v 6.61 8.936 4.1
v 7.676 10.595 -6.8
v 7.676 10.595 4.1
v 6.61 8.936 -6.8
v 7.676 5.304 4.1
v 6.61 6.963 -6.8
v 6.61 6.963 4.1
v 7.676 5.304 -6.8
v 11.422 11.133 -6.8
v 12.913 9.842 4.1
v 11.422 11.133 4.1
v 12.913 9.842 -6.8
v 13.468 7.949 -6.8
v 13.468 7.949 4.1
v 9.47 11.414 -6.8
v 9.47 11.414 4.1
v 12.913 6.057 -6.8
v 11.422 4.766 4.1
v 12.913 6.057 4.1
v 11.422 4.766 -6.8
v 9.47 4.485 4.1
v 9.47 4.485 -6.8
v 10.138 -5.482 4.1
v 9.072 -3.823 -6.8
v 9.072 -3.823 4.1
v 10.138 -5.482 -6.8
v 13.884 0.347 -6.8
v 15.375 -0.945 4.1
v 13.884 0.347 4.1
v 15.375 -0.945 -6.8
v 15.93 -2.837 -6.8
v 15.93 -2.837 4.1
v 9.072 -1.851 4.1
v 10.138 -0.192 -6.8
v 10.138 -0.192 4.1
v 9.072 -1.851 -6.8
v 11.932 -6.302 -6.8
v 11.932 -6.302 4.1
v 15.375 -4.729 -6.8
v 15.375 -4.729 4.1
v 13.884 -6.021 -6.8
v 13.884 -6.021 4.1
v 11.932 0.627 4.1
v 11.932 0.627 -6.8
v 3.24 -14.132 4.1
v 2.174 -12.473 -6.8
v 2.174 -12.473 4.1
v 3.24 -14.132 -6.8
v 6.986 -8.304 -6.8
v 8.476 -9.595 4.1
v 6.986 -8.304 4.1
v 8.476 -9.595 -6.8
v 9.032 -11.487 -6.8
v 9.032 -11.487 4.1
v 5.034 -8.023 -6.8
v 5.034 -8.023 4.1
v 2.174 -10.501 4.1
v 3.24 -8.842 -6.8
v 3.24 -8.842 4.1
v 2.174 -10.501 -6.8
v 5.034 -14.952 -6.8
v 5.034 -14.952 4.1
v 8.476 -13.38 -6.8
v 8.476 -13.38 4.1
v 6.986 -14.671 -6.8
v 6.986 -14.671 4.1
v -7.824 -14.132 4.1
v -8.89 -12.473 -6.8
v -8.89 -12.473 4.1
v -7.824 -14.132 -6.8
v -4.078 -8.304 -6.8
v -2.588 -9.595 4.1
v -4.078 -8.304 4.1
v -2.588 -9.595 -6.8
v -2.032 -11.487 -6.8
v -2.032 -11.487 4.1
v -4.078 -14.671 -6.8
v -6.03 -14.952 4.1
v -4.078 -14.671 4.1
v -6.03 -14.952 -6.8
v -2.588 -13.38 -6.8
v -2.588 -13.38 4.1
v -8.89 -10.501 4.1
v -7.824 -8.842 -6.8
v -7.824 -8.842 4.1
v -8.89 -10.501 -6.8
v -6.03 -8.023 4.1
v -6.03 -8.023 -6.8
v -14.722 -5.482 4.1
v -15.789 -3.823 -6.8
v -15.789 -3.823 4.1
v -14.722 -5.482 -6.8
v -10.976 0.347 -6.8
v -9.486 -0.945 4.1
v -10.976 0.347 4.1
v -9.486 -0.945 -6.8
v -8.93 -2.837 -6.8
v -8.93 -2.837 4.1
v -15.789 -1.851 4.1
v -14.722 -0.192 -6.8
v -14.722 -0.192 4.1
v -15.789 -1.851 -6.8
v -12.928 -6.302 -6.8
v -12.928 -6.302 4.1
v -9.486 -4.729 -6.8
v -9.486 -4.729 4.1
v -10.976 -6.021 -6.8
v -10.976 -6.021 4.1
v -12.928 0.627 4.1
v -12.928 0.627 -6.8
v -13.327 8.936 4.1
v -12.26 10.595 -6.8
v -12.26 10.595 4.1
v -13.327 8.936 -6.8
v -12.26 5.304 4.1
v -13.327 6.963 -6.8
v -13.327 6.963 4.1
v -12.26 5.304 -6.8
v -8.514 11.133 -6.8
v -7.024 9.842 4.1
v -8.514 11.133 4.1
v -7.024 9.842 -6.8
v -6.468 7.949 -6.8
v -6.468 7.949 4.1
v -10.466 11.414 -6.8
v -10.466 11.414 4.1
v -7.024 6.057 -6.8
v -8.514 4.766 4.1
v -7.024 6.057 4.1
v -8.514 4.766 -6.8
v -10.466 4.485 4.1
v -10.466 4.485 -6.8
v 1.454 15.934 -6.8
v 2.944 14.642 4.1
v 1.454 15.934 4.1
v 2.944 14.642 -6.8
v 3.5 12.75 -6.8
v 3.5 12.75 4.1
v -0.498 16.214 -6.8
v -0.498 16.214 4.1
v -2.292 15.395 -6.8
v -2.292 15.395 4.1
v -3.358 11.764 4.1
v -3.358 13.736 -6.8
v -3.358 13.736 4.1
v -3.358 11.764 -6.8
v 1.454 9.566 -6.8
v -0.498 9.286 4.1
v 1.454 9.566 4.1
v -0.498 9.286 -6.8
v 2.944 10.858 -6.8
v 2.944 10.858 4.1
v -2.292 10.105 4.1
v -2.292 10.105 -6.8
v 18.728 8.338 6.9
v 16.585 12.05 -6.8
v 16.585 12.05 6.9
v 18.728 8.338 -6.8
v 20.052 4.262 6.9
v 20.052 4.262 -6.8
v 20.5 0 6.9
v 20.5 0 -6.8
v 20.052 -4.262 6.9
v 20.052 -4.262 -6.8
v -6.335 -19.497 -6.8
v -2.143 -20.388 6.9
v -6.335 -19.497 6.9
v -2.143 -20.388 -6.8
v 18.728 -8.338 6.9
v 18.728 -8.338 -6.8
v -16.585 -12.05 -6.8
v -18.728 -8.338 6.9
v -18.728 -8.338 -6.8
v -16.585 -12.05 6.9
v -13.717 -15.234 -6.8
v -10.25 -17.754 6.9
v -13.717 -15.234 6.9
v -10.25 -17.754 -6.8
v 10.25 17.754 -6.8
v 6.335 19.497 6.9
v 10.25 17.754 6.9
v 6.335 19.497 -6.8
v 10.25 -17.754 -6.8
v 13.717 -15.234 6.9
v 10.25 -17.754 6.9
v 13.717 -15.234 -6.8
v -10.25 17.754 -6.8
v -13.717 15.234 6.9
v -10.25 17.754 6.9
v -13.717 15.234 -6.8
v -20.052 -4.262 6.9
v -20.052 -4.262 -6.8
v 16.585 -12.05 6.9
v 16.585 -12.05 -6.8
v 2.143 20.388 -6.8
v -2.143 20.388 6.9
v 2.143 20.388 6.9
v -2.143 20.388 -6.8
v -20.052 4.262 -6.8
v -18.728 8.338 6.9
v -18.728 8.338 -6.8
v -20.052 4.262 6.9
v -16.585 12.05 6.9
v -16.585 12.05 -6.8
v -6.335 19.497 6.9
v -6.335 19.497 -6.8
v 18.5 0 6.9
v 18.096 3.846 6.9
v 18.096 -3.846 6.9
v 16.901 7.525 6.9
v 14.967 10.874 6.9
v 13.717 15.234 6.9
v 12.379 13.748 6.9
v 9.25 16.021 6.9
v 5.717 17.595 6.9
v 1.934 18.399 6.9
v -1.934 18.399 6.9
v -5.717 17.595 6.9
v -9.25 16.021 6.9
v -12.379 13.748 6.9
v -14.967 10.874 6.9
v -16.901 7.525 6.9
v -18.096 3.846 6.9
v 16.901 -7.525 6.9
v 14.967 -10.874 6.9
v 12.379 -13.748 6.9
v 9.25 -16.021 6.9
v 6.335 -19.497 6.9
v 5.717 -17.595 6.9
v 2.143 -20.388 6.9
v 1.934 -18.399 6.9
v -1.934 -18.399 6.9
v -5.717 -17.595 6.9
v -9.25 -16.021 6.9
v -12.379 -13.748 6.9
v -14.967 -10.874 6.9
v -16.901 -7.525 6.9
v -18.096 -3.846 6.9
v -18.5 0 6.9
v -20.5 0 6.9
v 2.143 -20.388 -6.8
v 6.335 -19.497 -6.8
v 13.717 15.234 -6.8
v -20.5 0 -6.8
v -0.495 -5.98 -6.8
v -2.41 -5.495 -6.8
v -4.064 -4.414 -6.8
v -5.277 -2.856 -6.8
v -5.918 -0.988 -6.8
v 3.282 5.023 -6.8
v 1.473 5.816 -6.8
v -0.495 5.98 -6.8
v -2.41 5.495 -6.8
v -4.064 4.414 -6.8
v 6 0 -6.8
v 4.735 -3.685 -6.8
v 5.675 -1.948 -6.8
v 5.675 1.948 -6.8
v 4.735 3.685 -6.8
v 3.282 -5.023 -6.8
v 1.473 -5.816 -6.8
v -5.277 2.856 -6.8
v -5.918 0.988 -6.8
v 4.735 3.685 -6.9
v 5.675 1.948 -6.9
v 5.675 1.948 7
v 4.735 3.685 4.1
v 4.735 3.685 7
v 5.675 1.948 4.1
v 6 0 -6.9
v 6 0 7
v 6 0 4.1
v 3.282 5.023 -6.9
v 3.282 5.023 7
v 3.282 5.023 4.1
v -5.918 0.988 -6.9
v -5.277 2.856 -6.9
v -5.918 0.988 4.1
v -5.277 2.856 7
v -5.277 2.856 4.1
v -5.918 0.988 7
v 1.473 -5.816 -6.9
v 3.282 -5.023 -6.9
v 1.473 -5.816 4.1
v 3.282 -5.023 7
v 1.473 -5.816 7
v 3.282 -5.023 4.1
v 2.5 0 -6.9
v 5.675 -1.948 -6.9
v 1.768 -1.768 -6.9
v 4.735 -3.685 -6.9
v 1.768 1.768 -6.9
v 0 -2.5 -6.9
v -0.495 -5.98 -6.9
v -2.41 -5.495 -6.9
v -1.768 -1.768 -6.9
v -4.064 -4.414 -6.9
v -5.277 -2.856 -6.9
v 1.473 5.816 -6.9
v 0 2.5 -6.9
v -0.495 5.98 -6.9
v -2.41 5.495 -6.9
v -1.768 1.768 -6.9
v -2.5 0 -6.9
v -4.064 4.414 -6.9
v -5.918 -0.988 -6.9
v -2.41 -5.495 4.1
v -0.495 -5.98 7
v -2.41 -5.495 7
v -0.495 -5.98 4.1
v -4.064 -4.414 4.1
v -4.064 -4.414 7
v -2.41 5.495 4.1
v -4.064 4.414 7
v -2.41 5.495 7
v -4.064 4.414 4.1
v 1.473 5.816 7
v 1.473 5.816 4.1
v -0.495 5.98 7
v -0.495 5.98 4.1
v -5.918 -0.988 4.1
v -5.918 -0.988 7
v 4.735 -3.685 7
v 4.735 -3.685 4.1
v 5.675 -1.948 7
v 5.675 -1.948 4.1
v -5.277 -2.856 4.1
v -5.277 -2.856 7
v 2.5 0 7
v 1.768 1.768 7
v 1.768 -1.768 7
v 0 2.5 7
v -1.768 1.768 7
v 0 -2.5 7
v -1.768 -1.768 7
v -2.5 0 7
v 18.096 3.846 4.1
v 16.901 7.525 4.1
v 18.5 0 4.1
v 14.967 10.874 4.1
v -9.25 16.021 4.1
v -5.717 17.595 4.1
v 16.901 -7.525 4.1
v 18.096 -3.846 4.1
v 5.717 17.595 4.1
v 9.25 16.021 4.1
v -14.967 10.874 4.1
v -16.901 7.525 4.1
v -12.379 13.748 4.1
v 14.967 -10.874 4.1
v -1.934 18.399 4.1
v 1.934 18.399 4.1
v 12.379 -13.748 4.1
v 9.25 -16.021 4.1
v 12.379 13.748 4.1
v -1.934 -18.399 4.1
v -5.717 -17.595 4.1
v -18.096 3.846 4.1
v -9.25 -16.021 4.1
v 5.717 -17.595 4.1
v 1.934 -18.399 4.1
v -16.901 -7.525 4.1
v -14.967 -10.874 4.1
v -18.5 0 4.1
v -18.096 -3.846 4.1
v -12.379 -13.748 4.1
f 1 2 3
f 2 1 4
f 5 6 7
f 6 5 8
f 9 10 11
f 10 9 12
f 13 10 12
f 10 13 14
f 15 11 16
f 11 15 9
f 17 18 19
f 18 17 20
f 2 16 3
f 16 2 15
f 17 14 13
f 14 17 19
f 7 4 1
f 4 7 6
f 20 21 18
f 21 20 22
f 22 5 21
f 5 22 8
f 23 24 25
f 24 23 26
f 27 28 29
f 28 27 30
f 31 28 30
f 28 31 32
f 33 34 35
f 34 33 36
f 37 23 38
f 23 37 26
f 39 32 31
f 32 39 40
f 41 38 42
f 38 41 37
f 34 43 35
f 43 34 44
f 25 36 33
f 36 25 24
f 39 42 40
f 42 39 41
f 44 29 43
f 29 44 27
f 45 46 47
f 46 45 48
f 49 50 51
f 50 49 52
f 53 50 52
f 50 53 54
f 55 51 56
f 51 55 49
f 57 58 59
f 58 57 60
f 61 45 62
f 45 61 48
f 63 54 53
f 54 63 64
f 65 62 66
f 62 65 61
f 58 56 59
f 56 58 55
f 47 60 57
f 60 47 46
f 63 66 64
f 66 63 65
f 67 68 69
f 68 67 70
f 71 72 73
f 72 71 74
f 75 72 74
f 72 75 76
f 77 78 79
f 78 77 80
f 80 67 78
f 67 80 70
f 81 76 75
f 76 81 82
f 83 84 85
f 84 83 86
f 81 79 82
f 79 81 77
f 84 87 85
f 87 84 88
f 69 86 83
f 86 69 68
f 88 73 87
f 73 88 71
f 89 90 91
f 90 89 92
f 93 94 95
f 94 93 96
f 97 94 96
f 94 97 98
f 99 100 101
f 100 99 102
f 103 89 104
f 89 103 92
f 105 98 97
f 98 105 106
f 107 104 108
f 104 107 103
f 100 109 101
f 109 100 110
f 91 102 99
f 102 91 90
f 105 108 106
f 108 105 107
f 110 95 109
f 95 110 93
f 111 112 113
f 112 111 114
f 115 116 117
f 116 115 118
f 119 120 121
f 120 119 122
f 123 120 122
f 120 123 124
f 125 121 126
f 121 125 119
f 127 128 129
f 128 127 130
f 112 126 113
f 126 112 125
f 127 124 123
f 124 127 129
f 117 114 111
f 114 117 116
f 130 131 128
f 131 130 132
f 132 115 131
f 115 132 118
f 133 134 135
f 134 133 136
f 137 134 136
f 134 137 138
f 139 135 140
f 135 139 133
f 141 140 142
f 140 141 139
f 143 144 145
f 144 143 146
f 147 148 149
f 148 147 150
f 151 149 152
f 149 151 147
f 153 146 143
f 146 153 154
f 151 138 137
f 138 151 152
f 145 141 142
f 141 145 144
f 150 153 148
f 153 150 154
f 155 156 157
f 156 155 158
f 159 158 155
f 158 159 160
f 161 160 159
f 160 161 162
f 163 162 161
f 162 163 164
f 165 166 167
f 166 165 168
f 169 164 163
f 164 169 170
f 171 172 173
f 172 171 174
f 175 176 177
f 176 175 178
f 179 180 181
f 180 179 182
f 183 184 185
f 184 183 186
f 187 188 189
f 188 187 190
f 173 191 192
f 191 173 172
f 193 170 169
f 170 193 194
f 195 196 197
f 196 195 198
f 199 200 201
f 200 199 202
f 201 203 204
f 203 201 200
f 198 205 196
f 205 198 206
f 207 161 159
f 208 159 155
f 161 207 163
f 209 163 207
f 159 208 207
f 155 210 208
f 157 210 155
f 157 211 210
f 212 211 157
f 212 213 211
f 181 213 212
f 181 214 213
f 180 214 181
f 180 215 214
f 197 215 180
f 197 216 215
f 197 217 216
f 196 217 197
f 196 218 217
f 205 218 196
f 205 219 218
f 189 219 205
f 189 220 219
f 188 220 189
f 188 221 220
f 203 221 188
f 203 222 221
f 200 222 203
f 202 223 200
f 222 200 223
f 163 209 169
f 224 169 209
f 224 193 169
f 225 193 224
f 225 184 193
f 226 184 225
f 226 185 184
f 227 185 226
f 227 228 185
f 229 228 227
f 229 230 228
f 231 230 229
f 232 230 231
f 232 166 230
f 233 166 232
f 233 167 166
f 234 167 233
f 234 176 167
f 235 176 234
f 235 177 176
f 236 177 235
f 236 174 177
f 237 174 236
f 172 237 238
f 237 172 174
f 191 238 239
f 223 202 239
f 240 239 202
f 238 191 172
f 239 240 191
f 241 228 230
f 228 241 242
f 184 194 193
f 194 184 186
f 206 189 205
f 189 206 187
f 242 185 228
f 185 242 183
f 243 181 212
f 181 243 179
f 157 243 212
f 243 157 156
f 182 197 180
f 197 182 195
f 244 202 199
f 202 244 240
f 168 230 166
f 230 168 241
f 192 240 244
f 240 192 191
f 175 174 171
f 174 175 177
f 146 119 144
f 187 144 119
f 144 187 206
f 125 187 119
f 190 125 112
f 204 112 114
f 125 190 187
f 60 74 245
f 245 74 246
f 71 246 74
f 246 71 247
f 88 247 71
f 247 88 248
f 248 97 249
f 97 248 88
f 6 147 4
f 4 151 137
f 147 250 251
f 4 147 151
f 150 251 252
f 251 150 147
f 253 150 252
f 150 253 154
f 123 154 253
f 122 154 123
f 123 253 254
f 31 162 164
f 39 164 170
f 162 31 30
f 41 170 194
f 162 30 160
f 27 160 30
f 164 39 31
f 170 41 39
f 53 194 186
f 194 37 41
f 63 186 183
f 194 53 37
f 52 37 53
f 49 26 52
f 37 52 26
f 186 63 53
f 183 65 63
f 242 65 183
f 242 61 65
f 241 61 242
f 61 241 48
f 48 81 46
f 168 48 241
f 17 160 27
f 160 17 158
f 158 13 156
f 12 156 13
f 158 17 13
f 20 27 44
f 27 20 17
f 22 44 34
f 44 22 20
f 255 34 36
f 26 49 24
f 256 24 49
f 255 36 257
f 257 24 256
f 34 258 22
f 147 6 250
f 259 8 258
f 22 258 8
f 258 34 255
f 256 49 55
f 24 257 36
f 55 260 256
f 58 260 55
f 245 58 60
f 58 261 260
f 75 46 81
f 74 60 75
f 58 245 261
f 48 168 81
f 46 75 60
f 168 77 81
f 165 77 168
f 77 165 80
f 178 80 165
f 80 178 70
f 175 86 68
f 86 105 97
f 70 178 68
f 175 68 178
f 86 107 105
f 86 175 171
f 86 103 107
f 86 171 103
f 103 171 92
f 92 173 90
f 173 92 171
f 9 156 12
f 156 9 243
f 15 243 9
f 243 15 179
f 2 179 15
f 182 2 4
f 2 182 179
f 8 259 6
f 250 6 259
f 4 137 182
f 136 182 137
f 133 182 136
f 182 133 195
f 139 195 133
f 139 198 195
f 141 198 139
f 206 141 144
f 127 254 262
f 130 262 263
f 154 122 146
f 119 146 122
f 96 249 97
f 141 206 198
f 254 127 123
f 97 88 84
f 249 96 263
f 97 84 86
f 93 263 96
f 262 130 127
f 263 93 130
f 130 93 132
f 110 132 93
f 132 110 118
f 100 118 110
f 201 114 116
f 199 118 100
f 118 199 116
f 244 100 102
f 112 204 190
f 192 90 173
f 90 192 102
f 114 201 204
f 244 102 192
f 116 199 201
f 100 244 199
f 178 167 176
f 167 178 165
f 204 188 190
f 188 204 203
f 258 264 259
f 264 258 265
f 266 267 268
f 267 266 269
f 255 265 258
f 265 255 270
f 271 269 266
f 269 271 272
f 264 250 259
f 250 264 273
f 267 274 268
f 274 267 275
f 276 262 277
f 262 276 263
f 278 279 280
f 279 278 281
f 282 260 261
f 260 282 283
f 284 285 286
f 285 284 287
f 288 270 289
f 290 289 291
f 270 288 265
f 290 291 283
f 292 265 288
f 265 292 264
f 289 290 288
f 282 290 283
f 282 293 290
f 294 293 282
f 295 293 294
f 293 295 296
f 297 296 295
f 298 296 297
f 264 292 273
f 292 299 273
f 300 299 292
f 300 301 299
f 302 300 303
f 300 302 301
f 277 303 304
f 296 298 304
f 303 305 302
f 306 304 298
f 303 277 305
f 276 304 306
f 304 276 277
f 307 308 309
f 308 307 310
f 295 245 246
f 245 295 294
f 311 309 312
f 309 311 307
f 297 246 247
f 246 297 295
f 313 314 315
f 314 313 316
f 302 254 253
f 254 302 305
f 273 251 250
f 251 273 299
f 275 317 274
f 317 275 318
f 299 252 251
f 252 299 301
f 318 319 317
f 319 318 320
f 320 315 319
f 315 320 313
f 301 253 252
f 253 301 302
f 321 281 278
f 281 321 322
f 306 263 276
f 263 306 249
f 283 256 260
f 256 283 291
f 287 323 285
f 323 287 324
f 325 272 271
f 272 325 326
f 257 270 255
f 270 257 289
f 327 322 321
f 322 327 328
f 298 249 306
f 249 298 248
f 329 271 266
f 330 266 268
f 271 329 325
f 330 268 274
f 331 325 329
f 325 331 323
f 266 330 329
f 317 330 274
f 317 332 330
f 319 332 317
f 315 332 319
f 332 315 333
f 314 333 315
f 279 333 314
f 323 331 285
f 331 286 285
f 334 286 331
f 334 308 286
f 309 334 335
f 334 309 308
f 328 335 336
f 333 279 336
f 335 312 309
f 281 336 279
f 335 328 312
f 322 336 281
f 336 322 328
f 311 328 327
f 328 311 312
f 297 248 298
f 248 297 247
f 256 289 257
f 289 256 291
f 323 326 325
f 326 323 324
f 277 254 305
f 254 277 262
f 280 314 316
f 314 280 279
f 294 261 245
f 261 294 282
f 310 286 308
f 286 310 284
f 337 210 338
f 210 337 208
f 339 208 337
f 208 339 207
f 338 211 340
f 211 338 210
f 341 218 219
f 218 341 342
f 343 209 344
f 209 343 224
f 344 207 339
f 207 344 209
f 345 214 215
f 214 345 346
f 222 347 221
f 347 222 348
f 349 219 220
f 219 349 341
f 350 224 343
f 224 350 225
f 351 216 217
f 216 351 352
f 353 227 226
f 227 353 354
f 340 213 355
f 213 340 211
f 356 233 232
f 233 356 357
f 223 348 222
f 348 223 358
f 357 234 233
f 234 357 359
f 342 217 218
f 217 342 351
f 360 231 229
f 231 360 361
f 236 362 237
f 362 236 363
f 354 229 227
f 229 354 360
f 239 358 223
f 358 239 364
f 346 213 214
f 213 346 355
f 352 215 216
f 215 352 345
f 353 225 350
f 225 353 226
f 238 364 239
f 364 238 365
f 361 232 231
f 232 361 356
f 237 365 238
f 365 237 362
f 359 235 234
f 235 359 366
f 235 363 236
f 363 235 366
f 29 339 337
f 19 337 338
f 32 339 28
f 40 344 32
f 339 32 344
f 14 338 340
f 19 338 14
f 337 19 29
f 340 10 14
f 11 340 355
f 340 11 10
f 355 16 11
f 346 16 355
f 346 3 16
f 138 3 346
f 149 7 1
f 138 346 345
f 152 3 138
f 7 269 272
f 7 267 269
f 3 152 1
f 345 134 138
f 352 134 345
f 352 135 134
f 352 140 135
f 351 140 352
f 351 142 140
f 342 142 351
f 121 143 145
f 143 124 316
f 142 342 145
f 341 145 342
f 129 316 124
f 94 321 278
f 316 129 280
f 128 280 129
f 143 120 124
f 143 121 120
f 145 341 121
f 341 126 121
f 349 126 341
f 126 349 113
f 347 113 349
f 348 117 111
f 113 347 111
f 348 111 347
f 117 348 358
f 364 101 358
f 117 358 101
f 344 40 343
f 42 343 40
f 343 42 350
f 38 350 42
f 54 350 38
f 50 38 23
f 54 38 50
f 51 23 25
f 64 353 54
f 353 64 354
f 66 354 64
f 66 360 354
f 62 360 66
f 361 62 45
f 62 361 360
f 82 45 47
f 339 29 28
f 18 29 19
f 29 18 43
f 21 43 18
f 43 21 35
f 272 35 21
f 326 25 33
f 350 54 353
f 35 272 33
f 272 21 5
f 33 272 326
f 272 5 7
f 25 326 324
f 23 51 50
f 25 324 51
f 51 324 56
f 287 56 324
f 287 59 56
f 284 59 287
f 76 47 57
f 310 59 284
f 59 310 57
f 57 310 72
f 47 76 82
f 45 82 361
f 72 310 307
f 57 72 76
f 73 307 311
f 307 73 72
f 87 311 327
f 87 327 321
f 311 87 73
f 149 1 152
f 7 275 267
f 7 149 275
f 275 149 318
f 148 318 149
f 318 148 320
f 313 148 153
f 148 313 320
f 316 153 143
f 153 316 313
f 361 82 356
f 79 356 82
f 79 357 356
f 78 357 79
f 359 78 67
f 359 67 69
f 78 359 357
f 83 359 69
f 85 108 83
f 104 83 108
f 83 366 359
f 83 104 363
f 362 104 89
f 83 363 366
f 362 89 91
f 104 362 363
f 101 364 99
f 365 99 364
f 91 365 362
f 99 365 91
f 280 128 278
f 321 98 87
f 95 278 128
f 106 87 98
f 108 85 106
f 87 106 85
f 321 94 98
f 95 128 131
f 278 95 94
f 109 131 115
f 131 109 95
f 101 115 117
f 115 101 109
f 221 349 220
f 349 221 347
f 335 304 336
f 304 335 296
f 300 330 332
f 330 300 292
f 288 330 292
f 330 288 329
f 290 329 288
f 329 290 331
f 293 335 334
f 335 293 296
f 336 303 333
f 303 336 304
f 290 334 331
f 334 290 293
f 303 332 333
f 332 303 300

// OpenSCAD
// Helical Gears
// Catarina Mota
// catarinamfmota@gmail.com
// 20091123


//GEAR PARAMETERS
doubleHelical=1; //int: 0=no, 1=yes (will make the gear 2x taller)

gearHeight=7; //gear depth

pitchDiam=45; //pitch diameter

shaftDiam=5; //shaft diameter

//TEETH PARAMETERS
teethNum=20; //number of teeth (int)

addendum=2;

dedendum=2;

toothWidth=2;

angle=-30; //positive=right, negative=left

orientation=-1; //int: 1=left, -1=right

use_involute = true;

//CENTER SHAPE PARAMETERS
centerShape=3; //int: solid=1, star=2, circle=3

starNum=6; //number of lines for star shape (int)
starWidth=2; //width of star lines

circleNum=7; //number of circles (int)
circleDiam=7; //diameter of circles

//CENTER CIRCLE PARAMETERS
extrudeOut=1; //int: 0=no, 1=yes
extrudeOutHeight=3;
extrudeOutWidth=7; //in relationship to shaft

extrudeIn=1; //int: 0=no, 1=yes
extrudeInDiam=pitchDiam/2-dedendum*2;
extrudeInHeight=3;

//ROME (extrudeIn must be set to 0)
rome=0; //int: 0=no, 1=yes
romeDiam=pitchDiam/2; //pitch diameter for top gear
romeHeight=gearHeight; //top gear height
romeTeeth=teethNum*2/3;
romeAdd=2; //top gear addendum
romeDed=2; //top gear dedendum
romeToothWidth=2; //teeth width for top gear
romeAngle=5; //rotate top gear (angle)

//----------------------

gear();

//----------------------

//TOOTH
module tooth(heightGear, diamPitch) {

	toothHeight=addendum+dedendum*2;

	union(){
		translate([0,toothHeight/2,0]) rotateTooth(1);
		if (doubleHelical==1){
			translate([0,toothHeight/2,-heightGear+0.1]) rotateTooth(-1);
		}
	}

	module rotateTooth(direction){
		difference(){
			rotate([0,direction*angle,0])
			box(toothWidth,toothHeight,heightGear*1.5);

			translate([0,0,heightGear*0.75+dedendum/2])
			box(heightGear,toothHeight+0.5,dedendum+heightGear/2);

			translate([0,0,-heightGear*0.75-dedendum/2])
			box(heightGear,toothHeight+0.5,dedendum+heightGear/2);
		}
	}
}


//HELICAL
module helical(numTeeth, diamPitch, heightGear) {
	rootRad=diamPitch/2-dedendum;
	difference(){
		if (use_involute) {
			for (i = [ [0, 1, 0], [-heightGear, -1, 0.5] ]) {
				translate([ 0, 0, i[0] ]) rotate([ 0, 0, -angle*(i[2]) ])
				dxf_linear_extrude(file = str("invgear_n", numTeeth,
							"_m", (rootRad*2 + dedendum)/numTeeth,
							"_autogen.dxf"),
						convexity = 10, height = heightGear, twist = i[1]*angle/2, center = true);
			}
		}
		if (!use_involute) {
			for (i = [1:numTeeth]) {
				translate([sin(360*i/numTeeth)*(rootRad-dedendum), cos(360*i/numTeeth)*(rootRad-dedendum), 0 ]){
					rotate([0,0,-360*i/numTeeth]) tooth(heightGear, diamPitch);
				}
			}
		}
		translate([0,0,-gearHeight/2-1]) cylinder(heightGear+2, diamPitch/2-dedendum, diamPitch/2-dedendum);
	}
}

//SOLID
module solid(heightGear, diamPitch) {
	rootRad=diamPitch/2-dedendum;
	translate([0,0,-(heightGear*doubleHelical)+0.1*doubleHelical])
	cylinder(heightGear+(heightGear-0.1)*doubleHelical, rootRad, rootRad);
}

//STAR
module star() {
	starAngle=360/starNum;
	rootRad=diamPitch/2-dedendum;
	union(){
		for (s=[1:starNum]){
			translate([0,0,gearHeight/2-(gearHeight/2*doubleHelical)]){
				rotate([0, 0, s*starAngle]) dislocateBox(starWidth, (pitchDiam/2-dedendum*2)/2, gearHeight+(gearHeight*doubleHelical));
			}
		}
		translate ([0,0,-gearHeight*doubleHelical])
		tube(gearHeight+(gearHeight*doubleHelical), pitchDiam/2-dedendum, starWidth);
		translate ([0,0,-gearHeight*doubleHelical]){
			tube(gearHeight+(gearHeight*doubleHelical), pitchDiam/4+dedendum, starWidth);
			//cylinder(gearHeight+(gearHeight*doubleHelical), pitchDiam/4+dedendum, pitchDiam/4+dedendum);
		}
		translate([0,0,-gearHeight*doubleHelical])
		cylinder(gearHeight+(gearHeight*doubleHelical), shaftDiam/2+starWidth, shaftDiam/2+starWidth);
	}
}

//CIRCLE
module circle() {
	rootRad=pitchDiam/2-dedendum;
	difference(){
		solid(gearHeight-0.1*doubleHelical, pitchDiam);
		for (c=[1:circleNum]){
			translate([sin(360*c/circleNum)*(rootRad/2+shaftDiam/2), cos(360*c/circleNum)*(rootRad/2+shaftDiam/2), -gearHeight*doubleHelical]){
				cylinder(gearHeight+gearHeight*doubleHelical, circleDiam/2, circleDiam/2);
			}
		}
	}
}

//ROME
module romeGear(){
	translate([0,0,romeHeight/2+gearHeight]){
		rotate([0,0,romeAngle]){
			union(){
				helical(romeTeeth, romeDiam, romeHeight);
				translate ([0,0,-romeHeight/2]) solid(romeHeight, romeDiam);
			}
		}
	}
}

//GEAR
module gear(){

	difference () {

		union() {
			translate([0,0,gearHeight/2]) helical(teethNum, pitchDiam, gearHeight);

			if (centerShape==1) solid(gearHeight, pitchDiam);

			if (centerShape==2) star();

			if (centerShape==3) circle();

			if (rome==1) romeGear();

			//extrudeOut around shaft
			if (extrudeOut==1) {
translate([0,0,-gearHeight*doubleHelical+0.1*doubleHelical])	cylinder(gearHeight-(extrudeInHeight*extrudeIn)+extrudeOutHeight+romeHeight*rome+gearHeight*doubleHelical-0.1*doubleHelical, extrudeOutWidth/2+shaftDiam/2, extrudeOutWidth/2+shaftDiam/2);
			}

		}

	//extrudeIn around shaft
		if (extrudeIn==1) {
			difference(){
				translate([0,0,gearHeight-extrudeInHeight+0.1*doubleHelical]) cylinder(extrudeInHeight, extrudeInDiam, extrudeInDiam);
				cylinder(gearHeight+extrudeOutHeight, (extrudeOutWidth+shaftDiam)/2*extrudeOut, (extrudeOutWidth+shaftDiam)/2*extrudeOut);
			}
		}

	//shaft
	translate([0,0,-gearHeight*doubleHelical]) cylinder(gearHeight+extrudeOutHeight+romeHeight+(gearHeight*doubleHelical), shaftDiam/2, shaftDiam/2);
	}
}

//----------------------

//SILLY WAY TO GET AROUND ROTATION AXIS

module dislocateBox(xBox, yBox, zBox){
	translate([0,yBox,0]){
		difference(){
			box(xBox, yBox*2, zBox);
			translate([-xBox,0,0]) box(xBox, yBox*2, zBox);
		}
	}
}

//----------------------

module box(xBox, yBox, zBox) {
	scale ([xBox, yBox, zBox]) cube(1, true);
}

module cone(height, radius) {
		cylinder(height, radius, 0);
}

module oval(xOval, yOval, zOval) {
	scale ([xOval/100, yOval/100, 1]) cylinder(zOval, 50, 50);
}

module tube(height, radius, wall) {
	difference(){
		cylinder(height, radius, radius);
		cylinder(height, radius-wall, radius-wall);
	}
}

module hexagon(height, depth) {
	boxWidth=height/1.75;
		union(){
			box(boxWidth, height, depth);
			rotate([0,0,60]) box(boxWidth, height, depth);
			rotate([0,0,-60]) box(boxWidth, height, depth);
		}
}

module octagon(height, depth) {
	intersection(){
		box(height, height, depth);
		rotate([0,0,45]) box(height, height, depth);
	}
}

module dodecagon(height, depth) {
	intersection(){
		hexagon(height, depth);
		rotate([0,0,90]) hexagon(height, depth);
	}
}

module hexagram(height, depth) {
	boxWidth=height/1.75;
	intersection(){
		box(height, boxWidth, depth);
		rotate([0,0,60]) box(height, boxWidth, depth);
	}
	intersection(){
		box(height, boxWidth, depth);
		rotate([0,0,-60]) box(height, boxWidth, depth);
	}
	intersection(){
		rotate([0,0,60]) box(height, boxWidth, depth);
		rotate([0,0,-60]) box(height, boxWidth, depth);
	}
}

module rightTriangle(adjacent, opposite, depth) {
	difference(){
		translate([-adjacent/2,opposite/2,0]) box(adjacent, opposite, depth);
		translate([-adjacent,0,0]){
			rotate([0,0,atan(opposite/adjacent)]) dislocateBox(adjacent*2, opposite, depth);
		}
	}
}

module equiTriangle(side, depth) {
	difference(){
		translate([-side/2,side/2,0]) box(side, side, depth);
		rotate([0,0,30]) dislocateBox(side*2, side, depth);
		translate([-side,0,0]){
			rotate([0,0,60]) dislocateBox(side*2, side, depth);
		}
	}
}

module 12ptStar(height, depth) {
	starNum=3;
	starAngle=360/starNum;
	for (s=[1:starNum]){
		rotate([0, 0, s*starAngle]) box(height, height, depth);
	}
}
